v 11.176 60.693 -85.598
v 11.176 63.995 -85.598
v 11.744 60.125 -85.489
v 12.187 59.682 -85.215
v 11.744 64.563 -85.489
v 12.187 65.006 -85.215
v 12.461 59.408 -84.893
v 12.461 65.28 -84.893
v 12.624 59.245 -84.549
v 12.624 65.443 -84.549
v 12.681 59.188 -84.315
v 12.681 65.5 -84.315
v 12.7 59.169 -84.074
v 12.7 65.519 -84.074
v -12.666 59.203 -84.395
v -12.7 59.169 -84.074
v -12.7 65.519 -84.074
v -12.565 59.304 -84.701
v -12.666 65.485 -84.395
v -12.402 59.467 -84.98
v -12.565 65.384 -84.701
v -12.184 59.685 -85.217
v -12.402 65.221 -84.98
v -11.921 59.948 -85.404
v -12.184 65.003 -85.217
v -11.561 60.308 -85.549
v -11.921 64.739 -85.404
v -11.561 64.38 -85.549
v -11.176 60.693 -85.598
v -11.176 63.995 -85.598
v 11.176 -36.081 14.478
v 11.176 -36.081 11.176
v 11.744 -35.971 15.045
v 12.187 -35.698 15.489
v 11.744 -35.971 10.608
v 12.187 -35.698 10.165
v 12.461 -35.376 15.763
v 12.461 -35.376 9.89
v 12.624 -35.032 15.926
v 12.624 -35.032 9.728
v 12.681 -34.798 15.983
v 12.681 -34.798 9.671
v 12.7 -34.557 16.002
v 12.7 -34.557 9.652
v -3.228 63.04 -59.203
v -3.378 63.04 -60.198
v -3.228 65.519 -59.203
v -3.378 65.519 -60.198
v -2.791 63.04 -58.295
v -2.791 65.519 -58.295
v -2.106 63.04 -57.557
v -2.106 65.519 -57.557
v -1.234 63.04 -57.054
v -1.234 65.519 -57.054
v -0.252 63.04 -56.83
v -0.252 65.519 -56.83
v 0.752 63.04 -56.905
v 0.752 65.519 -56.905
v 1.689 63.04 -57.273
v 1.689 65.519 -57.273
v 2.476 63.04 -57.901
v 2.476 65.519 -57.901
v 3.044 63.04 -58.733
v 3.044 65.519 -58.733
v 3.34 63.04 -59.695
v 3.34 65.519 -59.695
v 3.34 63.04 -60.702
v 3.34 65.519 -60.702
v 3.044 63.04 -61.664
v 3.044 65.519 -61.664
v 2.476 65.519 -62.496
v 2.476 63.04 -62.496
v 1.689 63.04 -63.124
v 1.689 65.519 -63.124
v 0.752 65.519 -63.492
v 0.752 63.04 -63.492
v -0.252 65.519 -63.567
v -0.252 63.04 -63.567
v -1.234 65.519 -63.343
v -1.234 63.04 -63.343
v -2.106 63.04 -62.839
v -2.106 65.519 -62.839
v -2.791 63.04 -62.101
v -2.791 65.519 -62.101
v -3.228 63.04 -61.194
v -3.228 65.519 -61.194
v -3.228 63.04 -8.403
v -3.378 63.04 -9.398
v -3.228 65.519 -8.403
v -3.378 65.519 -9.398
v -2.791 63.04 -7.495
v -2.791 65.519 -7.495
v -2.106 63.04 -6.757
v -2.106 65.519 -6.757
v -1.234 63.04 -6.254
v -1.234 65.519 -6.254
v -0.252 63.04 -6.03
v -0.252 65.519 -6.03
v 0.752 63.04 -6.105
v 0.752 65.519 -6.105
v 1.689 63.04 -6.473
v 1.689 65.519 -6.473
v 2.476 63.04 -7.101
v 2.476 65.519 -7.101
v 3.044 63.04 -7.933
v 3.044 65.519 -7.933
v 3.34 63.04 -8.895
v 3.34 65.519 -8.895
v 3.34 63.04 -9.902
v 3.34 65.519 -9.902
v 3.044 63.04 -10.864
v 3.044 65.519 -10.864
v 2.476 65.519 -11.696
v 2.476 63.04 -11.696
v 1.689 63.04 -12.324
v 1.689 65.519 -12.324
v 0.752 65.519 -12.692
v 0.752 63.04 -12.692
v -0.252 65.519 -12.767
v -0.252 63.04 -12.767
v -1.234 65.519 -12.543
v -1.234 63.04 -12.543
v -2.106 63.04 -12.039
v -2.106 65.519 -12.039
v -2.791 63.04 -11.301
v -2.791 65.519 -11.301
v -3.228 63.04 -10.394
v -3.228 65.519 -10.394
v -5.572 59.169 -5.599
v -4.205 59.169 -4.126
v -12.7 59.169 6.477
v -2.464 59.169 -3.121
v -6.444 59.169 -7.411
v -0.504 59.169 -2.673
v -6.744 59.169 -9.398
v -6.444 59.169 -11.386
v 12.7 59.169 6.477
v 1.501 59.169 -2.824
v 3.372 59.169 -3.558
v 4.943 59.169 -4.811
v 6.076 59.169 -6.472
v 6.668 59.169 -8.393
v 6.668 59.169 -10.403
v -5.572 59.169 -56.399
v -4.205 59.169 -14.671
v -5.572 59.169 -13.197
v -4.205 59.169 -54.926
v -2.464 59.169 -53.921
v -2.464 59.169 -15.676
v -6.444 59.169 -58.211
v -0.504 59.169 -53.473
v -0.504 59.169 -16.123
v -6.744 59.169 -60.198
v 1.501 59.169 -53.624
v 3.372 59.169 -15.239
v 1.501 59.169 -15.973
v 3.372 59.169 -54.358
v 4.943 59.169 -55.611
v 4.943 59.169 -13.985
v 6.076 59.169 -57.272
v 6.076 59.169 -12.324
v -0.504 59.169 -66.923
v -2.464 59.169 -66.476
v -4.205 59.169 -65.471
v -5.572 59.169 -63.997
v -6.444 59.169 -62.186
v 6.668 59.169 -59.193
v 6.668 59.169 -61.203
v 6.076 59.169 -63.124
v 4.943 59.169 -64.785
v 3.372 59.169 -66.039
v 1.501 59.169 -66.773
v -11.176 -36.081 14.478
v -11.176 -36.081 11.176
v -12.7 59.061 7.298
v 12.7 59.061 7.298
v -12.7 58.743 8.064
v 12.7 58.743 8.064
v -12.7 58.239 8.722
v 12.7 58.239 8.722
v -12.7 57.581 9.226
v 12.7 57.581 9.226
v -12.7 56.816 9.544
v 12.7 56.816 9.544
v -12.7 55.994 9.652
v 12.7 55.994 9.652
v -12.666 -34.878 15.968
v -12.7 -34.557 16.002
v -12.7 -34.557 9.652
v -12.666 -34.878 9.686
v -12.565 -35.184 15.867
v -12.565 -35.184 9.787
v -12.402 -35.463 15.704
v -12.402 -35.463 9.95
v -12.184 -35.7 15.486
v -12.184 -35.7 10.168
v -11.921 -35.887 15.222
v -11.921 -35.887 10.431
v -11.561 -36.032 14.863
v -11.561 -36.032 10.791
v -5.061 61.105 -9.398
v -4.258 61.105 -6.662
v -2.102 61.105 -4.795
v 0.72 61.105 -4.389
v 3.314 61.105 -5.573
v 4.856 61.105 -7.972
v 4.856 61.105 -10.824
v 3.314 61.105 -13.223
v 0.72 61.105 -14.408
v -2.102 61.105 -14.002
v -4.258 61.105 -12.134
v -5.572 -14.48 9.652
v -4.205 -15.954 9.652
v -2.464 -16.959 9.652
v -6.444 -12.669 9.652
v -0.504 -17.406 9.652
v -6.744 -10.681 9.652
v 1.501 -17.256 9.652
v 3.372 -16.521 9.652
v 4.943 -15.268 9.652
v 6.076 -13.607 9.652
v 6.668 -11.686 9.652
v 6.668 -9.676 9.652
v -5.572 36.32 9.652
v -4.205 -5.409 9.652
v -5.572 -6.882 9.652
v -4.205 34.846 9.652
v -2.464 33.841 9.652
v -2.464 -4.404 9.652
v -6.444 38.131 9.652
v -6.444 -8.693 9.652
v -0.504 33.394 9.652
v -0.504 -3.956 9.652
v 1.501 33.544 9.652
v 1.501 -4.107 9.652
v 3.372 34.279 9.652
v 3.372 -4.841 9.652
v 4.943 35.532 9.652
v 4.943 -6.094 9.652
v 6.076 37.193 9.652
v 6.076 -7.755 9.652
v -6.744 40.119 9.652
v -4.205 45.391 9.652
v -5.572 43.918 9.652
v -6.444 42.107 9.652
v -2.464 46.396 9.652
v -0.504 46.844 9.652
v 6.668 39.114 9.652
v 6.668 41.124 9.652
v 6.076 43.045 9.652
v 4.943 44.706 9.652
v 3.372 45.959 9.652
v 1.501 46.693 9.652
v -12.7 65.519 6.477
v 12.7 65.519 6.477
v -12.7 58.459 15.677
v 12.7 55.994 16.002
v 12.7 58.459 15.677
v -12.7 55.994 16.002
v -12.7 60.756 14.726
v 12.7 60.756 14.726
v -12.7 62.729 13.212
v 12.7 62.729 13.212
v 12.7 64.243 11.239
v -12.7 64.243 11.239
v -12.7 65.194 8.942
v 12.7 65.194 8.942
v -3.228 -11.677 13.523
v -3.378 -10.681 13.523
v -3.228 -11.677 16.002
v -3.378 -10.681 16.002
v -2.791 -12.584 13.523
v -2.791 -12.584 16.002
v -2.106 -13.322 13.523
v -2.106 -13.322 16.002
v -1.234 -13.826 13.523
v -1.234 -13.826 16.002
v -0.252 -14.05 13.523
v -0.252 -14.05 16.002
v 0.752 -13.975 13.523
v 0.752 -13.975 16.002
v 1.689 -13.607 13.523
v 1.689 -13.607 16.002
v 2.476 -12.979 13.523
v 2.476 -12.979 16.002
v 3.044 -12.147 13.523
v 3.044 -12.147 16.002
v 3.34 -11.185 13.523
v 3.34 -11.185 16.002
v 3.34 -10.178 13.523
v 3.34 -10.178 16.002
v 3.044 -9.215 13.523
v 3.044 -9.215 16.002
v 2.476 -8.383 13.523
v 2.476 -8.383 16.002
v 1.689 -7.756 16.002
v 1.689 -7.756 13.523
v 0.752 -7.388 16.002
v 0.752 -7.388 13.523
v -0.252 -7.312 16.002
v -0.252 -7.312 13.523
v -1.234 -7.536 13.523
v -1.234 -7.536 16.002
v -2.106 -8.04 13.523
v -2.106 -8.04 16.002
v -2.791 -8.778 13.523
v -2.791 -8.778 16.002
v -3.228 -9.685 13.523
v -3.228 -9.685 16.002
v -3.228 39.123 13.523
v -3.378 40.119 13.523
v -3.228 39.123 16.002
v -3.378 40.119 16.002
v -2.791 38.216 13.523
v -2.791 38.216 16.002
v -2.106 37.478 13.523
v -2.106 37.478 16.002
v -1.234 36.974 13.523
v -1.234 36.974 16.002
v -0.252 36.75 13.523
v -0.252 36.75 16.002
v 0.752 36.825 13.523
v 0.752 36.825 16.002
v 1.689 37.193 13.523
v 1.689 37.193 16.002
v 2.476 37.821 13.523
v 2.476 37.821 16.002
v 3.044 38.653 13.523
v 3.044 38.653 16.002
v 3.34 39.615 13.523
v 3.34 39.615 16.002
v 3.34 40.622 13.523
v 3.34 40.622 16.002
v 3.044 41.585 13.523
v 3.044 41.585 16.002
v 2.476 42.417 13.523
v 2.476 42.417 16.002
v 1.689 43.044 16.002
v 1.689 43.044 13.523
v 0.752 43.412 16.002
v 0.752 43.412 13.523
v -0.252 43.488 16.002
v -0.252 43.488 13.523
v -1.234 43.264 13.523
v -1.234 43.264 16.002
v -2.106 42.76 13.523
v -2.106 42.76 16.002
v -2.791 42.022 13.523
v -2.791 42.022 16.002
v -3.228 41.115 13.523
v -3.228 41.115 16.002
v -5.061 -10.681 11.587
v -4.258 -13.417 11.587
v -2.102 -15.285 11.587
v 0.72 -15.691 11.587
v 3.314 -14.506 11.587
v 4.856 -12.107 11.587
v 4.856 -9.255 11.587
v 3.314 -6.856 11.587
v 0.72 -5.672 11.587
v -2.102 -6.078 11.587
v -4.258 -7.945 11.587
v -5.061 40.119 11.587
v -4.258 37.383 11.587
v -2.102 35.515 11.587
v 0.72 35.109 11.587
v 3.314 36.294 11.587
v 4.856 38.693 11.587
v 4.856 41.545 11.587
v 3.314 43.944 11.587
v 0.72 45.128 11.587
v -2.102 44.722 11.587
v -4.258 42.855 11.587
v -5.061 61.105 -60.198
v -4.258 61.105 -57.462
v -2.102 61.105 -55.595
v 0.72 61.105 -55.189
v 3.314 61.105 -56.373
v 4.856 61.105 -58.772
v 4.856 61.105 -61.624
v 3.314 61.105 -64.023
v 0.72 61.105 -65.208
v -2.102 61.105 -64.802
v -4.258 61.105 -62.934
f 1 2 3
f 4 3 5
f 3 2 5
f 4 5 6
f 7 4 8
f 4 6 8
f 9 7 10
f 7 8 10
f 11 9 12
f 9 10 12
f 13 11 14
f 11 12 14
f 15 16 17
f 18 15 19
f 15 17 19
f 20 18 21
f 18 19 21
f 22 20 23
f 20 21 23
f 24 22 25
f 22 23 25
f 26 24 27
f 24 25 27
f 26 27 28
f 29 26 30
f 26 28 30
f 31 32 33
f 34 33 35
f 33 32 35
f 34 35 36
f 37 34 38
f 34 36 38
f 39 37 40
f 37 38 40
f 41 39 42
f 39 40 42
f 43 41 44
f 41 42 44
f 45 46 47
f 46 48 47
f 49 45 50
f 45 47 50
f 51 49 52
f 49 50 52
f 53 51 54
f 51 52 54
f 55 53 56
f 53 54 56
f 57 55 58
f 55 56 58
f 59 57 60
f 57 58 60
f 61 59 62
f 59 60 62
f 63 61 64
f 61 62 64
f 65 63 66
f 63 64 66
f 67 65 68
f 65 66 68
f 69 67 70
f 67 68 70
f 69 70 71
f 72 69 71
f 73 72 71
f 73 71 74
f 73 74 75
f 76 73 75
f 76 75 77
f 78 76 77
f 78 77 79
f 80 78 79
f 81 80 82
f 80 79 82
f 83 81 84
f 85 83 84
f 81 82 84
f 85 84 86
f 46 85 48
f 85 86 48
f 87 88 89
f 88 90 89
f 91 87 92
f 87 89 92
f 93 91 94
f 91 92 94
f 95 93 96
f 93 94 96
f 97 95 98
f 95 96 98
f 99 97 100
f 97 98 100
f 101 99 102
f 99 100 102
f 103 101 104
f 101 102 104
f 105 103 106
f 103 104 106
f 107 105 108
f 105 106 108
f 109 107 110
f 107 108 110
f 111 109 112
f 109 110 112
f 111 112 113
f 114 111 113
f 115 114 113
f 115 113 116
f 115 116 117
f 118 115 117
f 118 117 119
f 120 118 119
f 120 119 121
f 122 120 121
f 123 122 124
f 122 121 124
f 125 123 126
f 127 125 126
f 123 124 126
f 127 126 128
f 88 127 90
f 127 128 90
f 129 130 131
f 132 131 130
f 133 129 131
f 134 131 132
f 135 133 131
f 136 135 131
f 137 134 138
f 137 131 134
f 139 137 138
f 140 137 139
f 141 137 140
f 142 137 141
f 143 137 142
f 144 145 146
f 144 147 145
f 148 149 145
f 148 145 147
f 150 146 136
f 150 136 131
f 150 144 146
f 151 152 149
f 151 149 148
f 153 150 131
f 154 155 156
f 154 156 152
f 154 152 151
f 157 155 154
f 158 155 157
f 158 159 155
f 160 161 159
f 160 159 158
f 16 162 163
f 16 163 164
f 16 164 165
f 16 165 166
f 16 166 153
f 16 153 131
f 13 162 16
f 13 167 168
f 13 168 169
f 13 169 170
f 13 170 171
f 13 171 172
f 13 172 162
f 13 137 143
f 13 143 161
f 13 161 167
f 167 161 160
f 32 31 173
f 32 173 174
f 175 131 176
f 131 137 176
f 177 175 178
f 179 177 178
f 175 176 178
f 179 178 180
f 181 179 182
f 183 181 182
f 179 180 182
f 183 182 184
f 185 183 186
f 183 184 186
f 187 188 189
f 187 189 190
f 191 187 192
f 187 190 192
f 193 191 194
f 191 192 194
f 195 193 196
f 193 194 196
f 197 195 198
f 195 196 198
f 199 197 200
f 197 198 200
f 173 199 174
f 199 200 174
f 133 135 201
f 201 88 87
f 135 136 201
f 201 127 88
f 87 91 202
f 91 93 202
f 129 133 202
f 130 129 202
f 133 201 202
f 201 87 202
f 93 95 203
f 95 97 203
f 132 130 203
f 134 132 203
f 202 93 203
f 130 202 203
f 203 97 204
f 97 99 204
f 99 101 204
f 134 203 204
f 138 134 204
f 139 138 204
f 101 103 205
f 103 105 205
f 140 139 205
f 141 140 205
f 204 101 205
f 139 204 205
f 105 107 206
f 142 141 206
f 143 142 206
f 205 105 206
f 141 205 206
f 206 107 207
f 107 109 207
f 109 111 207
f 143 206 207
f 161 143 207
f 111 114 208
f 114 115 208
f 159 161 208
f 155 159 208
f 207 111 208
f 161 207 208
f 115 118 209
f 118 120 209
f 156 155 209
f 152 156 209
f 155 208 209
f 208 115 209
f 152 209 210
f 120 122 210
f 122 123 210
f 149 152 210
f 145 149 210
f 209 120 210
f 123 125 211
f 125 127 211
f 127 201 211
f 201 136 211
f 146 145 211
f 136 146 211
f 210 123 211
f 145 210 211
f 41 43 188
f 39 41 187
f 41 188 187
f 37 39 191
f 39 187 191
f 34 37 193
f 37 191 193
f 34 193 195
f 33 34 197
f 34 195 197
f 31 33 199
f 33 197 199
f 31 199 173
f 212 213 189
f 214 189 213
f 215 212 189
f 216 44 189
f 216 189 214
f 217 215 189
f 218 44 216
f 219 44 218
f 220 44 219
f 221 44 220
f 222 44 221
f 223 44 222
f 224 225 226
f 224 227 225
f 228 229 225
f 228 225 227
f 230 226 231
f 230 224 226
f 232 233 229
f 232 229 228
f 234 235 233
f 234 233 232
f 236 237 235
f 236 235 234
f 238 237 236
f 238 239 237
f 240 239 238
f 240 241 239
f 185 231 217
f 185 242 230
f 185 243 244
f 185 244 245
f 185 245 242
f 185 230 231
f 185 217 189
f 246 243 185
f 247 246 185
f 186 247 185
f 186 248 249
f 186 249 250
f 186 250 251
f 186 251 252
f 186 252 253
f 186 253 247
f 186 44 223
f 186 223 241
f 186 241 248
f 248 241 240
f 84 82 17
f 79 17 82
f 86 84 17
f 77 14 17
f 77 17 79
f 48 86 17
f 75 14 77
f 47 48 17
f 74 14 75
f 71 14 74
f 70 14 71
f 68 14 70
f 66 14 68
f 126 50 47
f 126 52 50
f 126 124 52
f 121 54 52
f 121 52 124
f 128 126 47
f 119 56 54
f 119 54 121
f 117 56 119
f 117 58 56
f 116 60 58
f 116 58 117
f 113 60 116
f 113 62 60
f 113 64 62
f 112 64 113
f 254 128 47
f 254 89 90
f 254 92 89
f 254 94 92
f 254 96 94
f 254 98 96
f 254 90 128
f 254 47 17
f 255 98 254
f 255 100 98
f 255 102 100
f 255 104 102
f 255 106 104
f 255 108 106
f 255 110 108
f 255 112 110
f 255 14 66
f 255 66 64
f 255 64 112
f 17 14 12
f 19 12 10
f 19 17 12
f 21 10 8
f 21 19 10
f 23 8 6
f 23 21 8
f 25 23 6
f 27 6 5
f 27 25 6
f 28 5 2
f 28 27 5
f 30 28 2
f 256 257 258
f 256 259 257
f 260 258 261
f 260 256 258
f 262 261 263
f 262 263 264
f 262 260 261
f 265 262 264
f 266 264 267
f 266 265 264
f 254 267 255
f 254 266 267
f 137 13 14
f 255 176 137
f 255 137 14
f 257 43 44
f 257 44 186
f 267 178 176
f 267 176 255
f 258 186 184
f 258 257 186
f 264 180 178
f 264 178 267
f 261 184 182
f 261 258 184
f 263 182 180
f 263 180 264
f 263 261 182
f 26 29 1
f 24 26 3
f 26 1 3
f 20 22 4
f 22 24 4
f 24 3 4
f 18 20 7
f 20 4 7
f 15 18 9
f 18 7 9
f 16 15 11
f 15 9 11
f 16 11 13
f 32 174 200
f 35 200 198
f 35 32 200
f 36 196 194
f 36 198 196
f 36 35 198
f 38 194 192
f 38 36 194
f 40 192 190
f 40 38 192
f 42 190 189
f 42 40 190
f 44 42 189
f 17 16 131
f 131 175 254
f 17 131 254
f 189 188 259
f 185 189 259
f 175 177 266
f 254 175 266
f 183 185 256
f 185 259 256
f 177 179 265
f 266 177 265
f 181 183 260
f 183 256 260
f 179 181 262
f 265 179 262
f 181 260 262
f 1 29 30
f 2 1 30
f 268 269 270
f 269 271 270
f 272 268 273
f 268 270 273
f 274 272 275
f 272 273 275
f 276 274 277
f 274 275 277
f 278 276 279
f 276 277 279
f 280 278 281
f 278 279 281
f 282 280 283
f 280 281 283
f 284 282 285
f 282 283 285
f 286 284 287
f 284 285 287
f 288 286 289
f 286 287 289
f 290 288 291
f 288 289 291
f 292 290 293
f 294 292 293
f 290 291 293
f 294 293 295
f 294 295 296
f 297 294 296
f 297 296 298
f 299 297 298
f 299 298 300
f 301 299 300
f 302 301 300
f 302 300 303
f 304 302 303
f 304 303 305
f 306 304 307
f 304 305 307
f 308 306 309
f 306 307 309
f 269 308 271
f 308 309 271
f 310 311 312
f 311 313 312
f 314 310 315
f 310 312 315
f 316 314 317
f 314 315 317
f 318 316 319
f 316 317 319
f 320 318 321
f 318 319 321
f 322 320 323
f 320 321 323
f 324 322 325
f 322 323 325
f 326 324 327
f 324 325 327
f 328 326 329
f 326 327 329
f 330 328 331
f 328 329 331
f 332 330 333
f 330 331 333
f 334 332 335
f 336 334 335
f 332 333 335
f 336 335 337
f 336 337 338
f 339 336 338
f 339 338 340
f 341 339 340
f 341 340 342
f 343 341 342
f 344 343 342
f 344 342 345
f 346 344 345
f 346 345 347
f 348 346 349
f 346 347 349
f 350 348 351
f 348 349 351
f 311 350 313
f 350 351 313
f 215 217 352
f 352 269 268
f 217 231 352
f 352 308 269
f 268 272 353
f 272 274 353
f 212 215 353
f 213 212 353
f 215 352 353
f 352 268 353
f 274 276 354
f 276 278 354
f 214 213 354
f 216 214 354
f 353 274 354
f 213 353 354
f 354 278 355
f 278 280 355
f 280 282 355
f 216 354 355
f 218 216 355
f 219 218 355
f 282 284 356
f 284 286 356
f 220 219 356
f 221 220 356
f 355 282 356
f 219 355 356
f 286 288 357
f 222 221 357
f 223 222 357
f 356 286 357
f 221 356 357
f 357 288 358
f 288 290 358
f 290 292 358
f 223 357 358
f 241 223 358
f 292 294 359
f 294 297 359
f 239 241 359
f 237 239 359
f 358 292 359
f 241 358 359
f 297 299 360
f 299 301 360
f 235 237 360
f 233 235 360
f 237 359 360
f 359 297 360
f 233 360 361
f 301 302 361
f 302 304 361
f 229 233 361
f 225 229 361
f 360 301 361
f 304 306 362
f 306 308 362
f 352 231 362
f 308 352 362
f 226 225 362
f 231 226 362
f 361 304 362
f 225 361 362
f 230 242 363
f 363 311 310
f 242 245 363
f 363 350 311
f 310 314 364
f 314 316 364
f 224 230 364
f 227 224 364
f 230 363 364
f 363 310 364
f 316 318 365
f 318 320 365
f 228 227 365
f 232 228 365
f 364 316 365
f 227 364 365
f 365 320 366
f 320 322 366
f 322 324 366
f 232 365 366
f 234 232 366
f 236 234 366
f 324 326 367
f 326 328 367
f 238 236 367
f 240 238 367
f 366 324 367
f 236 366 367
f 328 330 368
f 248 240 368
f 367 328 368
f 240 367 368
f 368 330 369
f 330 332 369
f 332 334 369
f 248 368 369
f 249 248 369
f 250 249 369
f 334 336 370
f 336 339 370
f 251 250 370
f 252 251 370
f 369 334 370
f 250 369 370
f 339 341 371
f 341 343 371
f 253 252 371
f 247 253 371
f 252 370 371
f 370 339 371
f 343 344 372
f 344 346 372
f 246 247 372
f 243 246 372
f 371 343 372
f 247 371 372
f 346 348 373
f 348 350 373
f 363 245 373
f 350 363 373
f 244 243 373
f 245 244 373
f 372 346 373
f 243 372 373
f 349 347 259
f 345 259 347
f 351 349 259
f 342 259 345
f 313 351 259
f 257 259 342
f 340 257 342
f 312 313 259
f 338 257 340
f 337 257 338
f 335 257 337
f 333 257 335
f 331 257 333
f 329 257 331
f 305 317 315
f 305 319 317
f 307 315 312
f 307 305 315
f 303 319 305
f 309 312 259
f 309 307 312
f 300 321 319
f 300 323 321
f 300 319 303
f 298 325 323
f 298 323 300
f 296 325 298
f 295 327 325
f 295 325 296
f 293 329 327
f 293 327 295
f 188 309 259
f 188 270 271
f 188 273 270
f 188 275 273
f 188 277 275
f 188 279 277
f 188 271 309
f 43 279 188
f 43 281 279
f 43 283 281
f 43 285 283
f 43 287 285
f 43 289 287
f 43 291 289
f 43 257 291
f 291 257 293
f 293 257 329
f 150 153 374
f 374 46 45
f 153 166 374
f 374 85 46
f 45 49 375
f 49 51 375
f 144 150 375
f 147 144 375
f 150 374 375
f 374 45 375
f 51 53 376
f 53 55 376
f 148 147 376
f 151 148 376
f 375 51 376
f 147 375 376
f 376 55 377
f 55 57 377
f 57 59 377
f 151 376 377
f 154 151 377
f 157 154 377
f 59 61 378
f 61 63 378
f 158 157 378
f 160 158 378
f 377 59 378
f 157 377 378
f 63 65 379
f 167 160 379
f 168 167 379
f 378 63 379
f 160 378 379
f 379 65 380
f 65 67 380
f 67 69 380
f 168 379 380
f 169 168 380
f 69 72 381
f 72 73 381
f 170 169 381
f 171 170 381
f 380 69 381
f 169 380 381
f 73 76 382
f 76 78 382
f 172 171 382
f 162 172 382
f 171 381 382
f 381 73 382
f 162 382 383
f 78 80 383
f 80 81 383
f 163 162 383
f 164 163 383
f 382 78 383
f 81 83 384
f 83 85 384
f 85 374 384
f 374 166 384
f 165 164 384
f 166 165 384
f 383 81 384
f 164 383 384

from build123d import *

# Parameters (mm, degrees)
F1_DEPTH       = 12.7
F3_D           = 6.7564
F3_CSINK_D     = 13.4874
F3_CSINK_ANGLE = 82
F5_D           = 6.7564
F5_CSINK_D     = 13.4874
F5_CSINK_ANGLE = 82
F6_R           = 3.175
F7_R           = 9.525
F8_R           = 1.524


with BuildPart() as f1:
    # F0 (on Right) → F1 (new body, symmetric)
    with BuildSketch(Plane.YZ):
        Polygon((-36.0811725259, 16.0017143935), (-36.0811725259, 9.6517140046), (59.1688280165, 9.6517140046), (59.1688280165, -85.5982856065), (65.5188274741, -85.5982856065), (65.5188274741, 16.0017143935), align=None)
    extrude(amount=F1_DEPTH, both=True)

    # F3 (through all)
    with Locations(Plane.XZ.offset(-59.1688280165)):
        with Locations((0, -9.3982859954), (0, -60.1982859954)):
            CounterSinkHole(F3_D / 2, F3_CSINK_D / 2, counter_sink_angle=F3_CSINK_ANGLE)

    # F5 (through all)
    with Locations(Plane(origin=(0, 0, 9.6517140046), x_dir=(1, 0, 0), z_dir=(0, 0, -1))):
        with Locations((0, 10.6811719835), (0, -40.1188280165)):
            CounterSinkHole(F5_D / 2, F5_CSINK_D / 2, counter_sink_angle=F5_CSINK_ANGLE)

    # F6
    f6_edges = [f1.edges().sort_by_distance(p)[0] for p in [
        (0, 59.168828, 9.651714),
    ]]
    fillet(f6_edges, radius=F6_R)

    # F7
    f7_edges = [f1.edges().sort_by_distance(p)[0] for p in [
        (0, 65.518827, 16.001714),
    ]]
    fillet(f7_edges, radius=F7_R)

    # F8
    f8_edges = [f1.edges().sort_by_distance(p)[0] for p in [
        (12.7, 62.343828, -85.598286),
        (12.7, -36.081173, 12.826714),
        (-12.7, -36.081173, 12.826714),
        (-12.7, 62.343828, -85.598286),
        (0, 65.518827, -85.598286),
        (0, -36.081173, 16.001714),
        (0, -36.081173, 9.651714),
        (0, 59.168828, -85.598286),
    ]]
    fillet(f8_edges, radius=F8_R)


solid = f1.part
